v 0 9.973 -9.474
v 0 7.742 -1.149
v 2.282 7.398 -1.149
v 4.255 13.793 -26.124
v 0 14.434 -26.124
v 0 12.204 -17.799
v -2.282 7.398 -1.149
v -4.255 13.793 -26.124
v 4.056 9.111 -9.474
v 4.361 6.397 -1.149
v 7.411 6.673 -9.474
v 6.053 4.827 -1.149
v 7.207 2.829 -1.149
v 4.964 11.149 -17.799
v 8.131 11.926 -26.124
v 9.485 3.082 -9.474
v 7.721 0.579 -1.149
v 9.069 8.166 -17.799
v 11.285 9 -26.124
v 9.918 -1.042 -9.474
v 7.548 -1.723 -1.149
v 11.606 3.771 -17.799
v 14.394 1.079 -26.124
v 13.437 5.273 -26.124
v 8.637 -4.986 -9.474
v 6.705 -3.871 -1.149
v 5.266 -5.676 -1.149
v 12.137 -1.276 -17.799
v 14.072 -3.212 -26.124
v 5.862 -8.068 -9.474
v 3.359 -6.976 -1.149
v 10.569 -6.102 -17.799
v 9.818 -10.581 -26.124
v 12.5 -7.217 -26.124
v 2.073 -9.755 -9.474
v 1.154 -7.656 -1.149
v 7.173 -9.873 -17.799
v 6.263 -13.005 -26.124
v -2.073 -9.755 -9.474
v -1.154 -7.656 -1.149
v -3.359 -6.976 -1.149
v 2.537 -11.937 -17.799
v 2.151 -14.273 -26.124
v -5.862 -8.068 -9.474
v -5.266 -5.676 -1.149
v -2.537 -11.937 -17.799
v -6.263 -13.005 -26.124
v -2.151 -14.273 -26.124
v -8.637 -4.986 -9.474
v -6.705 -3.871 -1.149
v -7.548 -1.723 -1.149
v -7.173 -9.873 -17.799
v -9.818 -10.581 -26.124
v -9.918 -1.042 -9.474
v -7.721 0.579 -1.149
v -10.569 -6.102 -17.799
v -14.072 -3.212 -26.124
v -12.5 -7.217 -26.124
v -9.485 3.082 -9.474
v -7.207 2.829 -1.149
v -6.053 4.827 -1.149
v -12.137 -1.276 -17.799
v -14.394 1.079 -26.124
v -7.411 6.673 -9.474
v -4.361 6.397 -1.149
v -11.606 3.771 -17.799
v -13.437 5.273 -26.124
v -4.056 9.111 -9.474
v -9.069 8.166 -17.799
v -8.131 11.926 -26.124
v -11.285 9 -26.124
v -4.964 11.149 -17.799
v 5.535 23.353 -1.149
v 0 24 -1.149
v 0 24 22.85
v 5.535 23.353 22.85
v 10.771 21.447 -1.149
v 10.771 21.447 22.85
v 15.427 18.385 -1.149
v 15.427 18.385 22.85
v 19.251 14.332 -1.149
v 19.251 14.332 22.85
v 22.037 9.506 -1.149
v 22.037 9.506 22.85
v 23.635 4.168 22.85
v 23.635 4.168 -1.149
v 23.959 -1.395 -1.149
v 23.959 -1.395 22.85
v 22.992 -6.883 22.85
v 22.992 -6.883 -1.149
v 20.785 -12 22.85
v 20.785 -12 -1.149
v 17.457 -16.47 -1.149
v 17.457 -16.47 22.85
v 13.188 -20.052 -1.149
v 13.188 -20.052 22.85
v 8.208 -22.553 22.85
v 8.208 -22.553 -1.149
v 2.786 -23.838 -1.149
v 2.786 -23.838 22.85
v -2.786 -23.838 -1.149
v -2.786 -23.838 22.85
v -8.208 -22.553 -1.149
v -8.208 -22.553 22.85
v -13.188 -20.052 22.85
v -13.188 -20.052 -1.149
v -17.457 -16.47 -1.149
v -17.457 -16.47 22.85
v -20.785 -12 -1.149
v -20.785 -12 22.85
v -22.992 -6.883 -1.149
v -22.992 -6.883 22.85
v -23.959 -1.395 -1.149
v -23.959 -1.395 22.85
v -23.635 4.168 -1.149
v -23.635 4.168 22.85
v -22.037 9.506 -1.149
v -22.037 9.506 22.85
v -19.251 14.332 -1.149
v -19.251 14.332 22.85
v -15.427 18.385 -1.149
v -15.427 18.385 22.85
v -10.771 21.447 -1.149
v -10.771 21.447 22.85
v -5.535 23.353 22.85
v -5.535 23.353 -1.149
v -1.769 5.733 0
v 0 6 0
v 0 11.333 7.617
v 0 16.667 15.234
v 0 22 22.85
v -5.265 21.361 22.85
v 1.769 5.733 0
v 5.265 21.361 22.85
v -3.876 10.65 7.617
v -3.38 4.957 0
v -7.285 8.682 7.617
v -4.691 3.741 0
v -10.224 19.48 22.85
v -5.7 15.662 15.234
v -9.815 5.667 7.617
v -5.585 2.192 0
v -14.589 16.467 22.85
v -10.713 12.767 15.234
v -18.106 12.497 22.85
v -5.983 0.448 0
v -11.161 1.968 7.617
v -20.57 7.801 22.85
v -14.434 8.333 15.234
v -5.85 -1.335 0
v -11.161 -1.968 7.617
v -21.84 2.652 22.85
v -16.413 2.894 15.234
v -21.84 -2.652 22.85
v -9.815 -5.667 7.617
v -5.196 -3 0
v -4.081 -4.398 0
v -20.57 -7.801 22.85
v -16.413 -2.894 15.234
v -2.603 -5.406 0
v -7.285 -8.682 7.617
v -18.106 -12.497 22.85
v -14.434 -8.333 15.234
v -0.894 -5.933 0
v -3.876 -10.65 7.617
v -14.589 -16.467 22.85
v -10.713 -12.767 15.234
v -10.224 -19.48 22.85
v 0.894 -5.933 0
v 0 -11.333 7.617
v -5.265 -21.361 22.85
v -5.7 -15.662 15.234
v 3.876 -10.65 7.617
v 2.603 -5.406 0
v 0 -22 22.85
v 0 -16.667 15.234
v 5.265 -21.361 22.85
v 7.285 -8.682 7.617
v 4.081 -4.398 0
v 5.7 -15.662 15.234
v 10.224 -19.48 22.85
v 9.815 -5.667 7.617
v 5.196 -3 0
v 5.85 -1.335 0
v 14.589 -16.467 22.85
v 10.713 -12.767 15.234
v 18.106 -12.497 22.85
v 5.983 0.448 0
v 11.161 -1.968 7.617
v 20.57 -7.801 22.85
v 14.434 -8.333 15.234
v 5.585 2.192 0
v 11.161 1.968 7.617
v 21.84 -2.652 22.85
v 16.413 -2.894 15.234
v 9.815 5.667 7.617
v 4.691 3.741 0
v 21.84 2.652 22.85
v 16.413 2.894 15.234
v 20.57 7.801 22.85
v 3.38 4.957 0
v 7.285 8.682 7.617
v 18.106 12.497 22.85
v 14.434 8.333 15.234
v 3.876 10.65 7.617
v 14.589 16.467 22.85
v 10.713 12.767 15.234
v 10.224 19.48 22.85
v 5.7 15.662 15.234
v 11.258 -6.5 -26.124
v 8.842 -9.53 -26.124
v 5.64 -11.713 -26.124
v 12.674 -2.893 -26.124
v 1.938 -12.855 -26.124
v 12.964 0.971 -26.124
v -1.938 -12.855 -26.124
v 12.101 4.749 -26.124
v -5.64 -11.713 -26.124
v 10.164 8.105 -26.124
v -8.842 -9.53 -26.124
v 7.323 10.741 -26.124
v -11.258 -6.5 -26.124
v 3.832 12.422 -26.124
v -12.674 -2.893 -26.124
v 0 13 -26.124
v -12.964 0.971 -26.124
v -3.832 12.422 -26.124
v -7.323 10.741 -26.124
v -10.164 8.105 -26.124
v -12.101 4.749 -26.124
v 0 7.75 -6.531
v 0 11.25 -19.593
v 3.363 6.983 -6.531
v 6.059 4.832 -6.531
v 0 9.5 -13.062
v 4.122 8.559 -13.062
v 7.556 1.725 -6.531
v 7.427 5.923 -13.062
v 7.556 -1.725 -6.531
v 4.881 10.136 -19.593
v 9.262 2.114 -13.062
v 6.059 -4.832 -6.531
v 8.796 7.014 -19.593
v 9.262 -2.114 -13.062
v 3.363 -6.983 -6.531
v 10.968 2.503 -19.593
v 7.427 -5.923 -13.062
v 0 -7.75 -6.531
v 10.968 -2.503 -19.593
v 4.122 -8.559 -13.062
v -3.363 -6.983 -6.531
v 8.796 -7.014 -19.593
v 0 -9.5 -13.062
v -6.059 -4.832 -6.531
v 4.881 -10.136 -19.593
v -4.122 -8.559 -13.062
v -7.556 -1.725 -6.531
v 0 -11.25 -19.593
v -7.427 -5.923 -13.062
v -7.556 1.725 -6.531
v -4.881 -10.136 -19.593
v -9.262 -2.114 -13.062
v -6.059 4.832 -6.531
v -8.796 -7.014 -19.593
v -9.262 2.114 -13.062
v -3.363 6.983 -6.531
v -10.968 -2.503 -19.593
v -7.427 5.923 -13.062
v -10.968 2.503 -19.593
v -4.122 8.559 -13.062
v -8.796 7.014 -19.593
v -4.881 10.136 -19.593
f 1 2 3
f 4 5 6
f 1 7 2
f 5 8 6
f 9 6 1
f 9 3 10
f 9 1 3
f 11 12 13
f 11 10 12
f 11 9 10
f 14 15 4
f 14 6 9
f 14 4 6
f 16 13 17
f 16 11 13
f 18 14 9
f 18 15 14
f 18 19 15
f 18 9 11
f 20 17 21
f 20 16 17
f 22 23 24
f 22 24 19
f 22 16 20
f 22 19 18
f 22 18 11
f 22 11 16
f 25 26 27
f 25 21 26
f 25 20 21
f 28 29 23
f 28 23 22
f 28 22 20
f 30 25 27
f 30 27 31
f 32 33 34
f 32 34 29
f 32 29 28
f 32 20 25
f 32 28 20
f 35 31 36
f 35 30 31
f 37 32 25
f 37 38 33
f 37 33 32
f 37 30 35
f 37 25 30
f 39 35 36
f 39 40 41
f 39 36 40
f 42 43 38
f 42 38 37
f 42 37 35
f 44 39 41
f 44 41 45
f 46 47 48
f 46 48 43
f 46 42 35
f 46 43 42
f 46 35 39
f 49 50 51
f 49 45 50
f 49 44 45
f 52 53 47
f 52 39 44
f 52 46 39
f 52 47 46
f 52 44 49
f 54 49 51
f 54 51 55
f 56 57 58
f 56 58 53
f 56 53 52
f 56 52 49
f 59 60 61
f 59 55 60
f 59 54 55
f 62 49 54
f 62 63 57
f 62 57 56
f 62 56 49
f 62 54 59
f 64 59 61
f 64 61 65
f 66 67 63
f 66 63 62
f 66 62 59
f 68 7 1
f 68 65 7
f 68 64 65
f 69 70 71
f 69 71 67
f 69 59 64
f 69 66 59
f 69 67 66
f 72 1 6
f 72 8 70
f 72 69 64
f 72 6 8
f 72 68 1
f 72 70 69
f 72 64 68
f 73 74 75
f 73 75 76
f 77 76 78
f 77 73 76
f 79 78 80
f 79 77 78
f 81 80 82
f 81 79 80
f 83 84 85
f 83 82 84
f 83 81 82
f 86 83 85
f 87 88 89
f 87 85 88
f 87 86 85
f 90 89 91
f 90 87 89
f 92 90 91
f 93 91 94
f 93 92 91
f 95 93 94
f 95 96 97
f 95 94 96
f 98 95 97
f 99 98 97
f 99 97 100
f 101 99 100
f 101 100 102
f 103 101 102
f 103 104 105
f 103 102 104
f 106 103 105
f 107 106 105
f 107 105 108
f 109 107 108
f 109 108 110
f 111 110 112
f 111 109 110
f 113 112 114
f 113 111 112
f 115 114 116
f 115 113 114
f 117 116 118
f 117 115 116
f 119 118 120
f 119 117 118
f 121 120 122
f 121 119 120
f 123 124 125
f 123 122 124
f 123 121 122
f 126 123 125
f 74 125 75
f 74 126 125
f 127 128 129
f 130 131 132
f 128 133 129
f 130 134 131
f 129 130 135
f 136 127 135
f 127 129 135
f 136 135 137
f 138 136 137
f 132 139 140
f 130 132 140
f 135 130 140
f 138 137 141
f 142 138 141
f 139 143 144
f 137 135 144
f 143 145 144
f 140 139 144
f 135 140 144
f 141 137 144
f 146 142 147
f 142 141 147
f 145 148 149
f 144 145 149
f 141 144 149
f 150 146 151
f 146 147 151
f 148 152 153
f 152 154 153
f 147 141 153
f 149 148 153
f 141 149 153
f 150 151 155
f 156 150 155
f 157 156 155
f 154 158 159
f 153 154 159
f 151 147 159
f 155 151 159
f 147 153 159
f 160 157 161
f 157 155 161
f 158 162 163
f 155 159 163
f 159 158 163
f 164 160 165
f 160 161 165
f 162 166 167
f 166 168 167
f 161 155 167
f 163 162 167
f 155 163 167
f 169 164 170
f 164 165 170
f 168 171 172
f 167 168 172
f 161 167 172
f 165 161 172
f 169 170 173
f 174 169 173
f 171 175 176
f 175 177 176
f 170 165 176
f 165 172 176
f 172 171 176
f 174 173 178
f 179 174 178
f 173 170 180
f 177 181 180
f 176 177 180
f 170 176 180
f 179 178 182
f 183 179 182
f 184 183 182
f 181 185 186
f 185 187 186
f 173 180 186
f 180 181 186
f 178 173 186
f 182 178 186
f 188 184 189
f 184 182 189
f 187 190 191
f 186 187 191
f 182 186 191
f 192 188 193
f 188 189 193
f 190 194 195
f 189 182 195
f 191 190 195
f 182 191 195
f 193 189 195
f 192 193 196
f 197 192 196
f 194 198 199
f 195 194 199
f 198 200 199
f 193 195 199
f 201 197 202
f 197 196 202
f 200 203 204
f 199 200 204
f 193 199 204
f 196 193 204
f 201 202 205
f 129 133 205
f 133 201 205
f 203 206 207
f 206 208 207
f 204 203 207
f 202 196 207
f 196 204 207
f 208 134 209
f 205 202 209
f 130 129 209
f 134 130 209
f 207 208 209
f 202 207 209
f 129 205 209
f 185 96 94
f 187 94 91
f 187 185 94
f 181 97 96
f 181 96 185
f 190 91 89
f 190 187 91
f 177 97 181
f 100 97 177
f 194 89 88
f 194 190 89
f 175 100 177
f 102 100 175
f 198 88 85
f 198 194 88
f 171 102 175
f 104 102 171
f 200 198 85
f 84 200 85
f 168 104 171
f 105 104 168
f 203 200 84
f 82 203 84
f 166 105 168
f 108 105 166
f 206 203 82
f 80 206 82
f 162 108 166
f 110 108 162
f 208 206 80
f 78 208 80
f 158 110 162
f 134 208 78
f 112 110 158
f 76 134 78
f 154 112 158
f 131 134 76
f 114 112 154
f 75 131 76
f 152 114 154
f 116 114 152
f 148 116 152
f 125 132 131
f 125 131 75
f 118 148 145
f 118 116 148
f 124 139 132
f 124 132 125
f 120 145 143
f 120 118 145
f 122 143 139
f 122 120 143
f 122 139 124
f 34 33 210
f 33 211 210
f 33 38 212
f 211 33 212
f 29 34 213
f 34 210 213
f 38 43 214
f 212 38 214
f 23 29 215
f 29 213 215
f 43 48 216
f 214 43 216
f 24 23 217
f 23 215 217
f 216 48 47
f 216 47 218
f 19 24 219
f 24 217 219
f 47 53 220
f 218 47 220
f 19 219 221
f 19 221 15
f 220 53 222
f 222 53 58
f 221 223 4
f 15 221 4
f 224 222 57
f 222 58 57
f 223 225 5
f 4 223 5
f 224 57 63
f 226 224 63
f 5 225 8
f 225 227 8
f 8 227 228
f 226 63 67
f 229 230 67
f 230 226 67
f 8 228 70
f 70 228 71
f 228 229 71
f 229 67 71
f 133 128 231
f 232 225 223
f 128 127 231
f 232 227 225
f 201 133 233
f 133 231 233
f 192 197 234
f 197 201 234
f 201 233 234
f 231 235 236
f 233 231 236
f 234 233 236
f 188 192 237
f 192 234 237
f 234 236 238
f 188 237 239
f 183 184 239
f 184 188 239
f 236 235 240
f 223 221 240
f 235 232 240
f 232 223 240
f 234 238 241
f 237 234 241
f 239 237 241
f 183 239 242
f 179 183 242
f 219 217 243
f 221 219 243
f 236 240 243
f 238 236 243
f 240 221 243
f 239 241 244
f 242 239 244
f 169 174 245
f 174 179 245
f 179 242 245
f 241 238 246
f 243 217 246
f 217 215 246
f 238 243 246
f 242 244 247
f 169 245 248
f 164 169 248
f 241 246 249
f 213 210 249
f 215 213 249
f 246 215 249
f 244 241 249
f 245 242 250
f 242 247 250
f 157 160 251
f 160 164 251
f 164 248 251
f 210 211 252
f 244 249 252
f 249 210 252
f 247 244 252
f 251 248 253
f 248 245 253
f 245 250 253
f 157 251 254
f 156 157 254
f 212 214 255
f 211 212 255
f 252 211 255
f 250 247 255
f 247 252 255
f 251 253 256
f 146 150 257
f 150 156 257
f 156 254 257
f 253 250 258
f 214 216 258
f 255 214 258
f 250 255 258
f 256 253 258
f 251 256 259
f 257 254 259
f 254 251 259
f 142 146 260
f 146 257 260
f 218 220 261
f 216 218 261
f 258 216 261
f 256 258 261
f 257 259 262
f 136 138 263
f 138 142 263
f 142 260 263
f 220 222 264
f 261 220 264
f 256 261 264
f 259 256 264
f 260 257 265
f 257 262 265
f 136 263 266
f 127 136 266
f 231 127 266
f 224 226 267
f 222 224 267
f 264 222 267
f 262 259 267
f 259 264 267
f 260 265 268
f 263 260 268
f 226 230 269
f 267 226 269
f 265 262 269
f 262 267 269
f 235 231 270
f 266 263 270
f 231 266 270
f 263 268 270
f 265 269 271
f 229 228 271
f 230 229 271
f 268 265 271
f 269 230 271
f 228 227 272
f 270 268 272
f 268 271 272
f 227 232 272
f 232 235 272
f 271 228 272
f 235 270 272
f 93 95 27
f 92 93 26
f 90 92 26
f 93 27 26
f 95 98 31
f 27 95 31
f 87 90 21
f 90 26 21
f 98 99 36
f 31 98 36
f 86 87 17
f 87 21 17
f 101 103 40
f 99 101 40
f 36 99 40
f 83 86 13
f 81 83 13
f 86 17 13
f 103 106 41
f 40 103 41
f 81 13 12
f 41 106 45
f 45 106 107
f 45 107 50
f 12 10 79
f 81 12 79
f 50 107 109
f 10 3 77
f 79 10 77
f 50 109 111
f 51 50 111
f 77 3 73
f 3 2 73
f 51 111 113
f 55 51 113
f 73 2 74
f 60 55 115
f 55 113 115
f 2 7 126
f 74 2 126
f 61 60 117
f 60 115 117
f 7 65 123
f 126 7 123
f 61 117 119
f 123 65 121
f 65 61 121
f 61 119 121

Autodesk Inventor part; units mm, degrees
ref_plane "YZ Plane" through (0, 0, 0) normal (1, 0, 0) x (0, 1, 0)
ref_plane "XZ Plane" through (0, 0, 0) normal (0, 1, 0) x (-1, 0, 0)
ref_plane "XY Plane" through (0, 0, 0) normal (0, 0, 1) x (1, 0, 0)
sketch "Sketch1" plane through (0, 0, 0) normal (1, 0, 0) x (0, 1, 0)
  line L0 (22, 22.8504) -> (6, 0)
  line L1 (6, 0) -> (13, -26.1244)
  line L2 (13, -26.1244) -> (14.4343, -26.1244)
  line L3 (14.4343, -26.1244) -> (7.7423, -1.1493)
  line L4 (7.7423, -1.1493) -> (24, -1.1493)
  line L5 (22, 22.8504) -> (24, 22.8504)
  line L6 (24, 22.8504) -> (24, -1.1493)
  line L7 (0, 0) -> (6, 0) construction
  line L8 (0, 0) -> (0, 52.5591) construction
  dimension "d1" = 105
  dimension "d2" = 105
  dimension "d3" = 24
  dimension "d4" = 22
  dimension "d5" = 13
  dimension "d6" = 35
  dimension "d8" = 6
  dimension "d9" = 23.9997
  dimension "d10" = 7.181
  dimension "d11" = 29.7087
revolve "Revolution1" add sketch "Sketch1" angle 360 about axis through (0, 0, 0) along (0, 0, 1)
properties part number "nozzle"
